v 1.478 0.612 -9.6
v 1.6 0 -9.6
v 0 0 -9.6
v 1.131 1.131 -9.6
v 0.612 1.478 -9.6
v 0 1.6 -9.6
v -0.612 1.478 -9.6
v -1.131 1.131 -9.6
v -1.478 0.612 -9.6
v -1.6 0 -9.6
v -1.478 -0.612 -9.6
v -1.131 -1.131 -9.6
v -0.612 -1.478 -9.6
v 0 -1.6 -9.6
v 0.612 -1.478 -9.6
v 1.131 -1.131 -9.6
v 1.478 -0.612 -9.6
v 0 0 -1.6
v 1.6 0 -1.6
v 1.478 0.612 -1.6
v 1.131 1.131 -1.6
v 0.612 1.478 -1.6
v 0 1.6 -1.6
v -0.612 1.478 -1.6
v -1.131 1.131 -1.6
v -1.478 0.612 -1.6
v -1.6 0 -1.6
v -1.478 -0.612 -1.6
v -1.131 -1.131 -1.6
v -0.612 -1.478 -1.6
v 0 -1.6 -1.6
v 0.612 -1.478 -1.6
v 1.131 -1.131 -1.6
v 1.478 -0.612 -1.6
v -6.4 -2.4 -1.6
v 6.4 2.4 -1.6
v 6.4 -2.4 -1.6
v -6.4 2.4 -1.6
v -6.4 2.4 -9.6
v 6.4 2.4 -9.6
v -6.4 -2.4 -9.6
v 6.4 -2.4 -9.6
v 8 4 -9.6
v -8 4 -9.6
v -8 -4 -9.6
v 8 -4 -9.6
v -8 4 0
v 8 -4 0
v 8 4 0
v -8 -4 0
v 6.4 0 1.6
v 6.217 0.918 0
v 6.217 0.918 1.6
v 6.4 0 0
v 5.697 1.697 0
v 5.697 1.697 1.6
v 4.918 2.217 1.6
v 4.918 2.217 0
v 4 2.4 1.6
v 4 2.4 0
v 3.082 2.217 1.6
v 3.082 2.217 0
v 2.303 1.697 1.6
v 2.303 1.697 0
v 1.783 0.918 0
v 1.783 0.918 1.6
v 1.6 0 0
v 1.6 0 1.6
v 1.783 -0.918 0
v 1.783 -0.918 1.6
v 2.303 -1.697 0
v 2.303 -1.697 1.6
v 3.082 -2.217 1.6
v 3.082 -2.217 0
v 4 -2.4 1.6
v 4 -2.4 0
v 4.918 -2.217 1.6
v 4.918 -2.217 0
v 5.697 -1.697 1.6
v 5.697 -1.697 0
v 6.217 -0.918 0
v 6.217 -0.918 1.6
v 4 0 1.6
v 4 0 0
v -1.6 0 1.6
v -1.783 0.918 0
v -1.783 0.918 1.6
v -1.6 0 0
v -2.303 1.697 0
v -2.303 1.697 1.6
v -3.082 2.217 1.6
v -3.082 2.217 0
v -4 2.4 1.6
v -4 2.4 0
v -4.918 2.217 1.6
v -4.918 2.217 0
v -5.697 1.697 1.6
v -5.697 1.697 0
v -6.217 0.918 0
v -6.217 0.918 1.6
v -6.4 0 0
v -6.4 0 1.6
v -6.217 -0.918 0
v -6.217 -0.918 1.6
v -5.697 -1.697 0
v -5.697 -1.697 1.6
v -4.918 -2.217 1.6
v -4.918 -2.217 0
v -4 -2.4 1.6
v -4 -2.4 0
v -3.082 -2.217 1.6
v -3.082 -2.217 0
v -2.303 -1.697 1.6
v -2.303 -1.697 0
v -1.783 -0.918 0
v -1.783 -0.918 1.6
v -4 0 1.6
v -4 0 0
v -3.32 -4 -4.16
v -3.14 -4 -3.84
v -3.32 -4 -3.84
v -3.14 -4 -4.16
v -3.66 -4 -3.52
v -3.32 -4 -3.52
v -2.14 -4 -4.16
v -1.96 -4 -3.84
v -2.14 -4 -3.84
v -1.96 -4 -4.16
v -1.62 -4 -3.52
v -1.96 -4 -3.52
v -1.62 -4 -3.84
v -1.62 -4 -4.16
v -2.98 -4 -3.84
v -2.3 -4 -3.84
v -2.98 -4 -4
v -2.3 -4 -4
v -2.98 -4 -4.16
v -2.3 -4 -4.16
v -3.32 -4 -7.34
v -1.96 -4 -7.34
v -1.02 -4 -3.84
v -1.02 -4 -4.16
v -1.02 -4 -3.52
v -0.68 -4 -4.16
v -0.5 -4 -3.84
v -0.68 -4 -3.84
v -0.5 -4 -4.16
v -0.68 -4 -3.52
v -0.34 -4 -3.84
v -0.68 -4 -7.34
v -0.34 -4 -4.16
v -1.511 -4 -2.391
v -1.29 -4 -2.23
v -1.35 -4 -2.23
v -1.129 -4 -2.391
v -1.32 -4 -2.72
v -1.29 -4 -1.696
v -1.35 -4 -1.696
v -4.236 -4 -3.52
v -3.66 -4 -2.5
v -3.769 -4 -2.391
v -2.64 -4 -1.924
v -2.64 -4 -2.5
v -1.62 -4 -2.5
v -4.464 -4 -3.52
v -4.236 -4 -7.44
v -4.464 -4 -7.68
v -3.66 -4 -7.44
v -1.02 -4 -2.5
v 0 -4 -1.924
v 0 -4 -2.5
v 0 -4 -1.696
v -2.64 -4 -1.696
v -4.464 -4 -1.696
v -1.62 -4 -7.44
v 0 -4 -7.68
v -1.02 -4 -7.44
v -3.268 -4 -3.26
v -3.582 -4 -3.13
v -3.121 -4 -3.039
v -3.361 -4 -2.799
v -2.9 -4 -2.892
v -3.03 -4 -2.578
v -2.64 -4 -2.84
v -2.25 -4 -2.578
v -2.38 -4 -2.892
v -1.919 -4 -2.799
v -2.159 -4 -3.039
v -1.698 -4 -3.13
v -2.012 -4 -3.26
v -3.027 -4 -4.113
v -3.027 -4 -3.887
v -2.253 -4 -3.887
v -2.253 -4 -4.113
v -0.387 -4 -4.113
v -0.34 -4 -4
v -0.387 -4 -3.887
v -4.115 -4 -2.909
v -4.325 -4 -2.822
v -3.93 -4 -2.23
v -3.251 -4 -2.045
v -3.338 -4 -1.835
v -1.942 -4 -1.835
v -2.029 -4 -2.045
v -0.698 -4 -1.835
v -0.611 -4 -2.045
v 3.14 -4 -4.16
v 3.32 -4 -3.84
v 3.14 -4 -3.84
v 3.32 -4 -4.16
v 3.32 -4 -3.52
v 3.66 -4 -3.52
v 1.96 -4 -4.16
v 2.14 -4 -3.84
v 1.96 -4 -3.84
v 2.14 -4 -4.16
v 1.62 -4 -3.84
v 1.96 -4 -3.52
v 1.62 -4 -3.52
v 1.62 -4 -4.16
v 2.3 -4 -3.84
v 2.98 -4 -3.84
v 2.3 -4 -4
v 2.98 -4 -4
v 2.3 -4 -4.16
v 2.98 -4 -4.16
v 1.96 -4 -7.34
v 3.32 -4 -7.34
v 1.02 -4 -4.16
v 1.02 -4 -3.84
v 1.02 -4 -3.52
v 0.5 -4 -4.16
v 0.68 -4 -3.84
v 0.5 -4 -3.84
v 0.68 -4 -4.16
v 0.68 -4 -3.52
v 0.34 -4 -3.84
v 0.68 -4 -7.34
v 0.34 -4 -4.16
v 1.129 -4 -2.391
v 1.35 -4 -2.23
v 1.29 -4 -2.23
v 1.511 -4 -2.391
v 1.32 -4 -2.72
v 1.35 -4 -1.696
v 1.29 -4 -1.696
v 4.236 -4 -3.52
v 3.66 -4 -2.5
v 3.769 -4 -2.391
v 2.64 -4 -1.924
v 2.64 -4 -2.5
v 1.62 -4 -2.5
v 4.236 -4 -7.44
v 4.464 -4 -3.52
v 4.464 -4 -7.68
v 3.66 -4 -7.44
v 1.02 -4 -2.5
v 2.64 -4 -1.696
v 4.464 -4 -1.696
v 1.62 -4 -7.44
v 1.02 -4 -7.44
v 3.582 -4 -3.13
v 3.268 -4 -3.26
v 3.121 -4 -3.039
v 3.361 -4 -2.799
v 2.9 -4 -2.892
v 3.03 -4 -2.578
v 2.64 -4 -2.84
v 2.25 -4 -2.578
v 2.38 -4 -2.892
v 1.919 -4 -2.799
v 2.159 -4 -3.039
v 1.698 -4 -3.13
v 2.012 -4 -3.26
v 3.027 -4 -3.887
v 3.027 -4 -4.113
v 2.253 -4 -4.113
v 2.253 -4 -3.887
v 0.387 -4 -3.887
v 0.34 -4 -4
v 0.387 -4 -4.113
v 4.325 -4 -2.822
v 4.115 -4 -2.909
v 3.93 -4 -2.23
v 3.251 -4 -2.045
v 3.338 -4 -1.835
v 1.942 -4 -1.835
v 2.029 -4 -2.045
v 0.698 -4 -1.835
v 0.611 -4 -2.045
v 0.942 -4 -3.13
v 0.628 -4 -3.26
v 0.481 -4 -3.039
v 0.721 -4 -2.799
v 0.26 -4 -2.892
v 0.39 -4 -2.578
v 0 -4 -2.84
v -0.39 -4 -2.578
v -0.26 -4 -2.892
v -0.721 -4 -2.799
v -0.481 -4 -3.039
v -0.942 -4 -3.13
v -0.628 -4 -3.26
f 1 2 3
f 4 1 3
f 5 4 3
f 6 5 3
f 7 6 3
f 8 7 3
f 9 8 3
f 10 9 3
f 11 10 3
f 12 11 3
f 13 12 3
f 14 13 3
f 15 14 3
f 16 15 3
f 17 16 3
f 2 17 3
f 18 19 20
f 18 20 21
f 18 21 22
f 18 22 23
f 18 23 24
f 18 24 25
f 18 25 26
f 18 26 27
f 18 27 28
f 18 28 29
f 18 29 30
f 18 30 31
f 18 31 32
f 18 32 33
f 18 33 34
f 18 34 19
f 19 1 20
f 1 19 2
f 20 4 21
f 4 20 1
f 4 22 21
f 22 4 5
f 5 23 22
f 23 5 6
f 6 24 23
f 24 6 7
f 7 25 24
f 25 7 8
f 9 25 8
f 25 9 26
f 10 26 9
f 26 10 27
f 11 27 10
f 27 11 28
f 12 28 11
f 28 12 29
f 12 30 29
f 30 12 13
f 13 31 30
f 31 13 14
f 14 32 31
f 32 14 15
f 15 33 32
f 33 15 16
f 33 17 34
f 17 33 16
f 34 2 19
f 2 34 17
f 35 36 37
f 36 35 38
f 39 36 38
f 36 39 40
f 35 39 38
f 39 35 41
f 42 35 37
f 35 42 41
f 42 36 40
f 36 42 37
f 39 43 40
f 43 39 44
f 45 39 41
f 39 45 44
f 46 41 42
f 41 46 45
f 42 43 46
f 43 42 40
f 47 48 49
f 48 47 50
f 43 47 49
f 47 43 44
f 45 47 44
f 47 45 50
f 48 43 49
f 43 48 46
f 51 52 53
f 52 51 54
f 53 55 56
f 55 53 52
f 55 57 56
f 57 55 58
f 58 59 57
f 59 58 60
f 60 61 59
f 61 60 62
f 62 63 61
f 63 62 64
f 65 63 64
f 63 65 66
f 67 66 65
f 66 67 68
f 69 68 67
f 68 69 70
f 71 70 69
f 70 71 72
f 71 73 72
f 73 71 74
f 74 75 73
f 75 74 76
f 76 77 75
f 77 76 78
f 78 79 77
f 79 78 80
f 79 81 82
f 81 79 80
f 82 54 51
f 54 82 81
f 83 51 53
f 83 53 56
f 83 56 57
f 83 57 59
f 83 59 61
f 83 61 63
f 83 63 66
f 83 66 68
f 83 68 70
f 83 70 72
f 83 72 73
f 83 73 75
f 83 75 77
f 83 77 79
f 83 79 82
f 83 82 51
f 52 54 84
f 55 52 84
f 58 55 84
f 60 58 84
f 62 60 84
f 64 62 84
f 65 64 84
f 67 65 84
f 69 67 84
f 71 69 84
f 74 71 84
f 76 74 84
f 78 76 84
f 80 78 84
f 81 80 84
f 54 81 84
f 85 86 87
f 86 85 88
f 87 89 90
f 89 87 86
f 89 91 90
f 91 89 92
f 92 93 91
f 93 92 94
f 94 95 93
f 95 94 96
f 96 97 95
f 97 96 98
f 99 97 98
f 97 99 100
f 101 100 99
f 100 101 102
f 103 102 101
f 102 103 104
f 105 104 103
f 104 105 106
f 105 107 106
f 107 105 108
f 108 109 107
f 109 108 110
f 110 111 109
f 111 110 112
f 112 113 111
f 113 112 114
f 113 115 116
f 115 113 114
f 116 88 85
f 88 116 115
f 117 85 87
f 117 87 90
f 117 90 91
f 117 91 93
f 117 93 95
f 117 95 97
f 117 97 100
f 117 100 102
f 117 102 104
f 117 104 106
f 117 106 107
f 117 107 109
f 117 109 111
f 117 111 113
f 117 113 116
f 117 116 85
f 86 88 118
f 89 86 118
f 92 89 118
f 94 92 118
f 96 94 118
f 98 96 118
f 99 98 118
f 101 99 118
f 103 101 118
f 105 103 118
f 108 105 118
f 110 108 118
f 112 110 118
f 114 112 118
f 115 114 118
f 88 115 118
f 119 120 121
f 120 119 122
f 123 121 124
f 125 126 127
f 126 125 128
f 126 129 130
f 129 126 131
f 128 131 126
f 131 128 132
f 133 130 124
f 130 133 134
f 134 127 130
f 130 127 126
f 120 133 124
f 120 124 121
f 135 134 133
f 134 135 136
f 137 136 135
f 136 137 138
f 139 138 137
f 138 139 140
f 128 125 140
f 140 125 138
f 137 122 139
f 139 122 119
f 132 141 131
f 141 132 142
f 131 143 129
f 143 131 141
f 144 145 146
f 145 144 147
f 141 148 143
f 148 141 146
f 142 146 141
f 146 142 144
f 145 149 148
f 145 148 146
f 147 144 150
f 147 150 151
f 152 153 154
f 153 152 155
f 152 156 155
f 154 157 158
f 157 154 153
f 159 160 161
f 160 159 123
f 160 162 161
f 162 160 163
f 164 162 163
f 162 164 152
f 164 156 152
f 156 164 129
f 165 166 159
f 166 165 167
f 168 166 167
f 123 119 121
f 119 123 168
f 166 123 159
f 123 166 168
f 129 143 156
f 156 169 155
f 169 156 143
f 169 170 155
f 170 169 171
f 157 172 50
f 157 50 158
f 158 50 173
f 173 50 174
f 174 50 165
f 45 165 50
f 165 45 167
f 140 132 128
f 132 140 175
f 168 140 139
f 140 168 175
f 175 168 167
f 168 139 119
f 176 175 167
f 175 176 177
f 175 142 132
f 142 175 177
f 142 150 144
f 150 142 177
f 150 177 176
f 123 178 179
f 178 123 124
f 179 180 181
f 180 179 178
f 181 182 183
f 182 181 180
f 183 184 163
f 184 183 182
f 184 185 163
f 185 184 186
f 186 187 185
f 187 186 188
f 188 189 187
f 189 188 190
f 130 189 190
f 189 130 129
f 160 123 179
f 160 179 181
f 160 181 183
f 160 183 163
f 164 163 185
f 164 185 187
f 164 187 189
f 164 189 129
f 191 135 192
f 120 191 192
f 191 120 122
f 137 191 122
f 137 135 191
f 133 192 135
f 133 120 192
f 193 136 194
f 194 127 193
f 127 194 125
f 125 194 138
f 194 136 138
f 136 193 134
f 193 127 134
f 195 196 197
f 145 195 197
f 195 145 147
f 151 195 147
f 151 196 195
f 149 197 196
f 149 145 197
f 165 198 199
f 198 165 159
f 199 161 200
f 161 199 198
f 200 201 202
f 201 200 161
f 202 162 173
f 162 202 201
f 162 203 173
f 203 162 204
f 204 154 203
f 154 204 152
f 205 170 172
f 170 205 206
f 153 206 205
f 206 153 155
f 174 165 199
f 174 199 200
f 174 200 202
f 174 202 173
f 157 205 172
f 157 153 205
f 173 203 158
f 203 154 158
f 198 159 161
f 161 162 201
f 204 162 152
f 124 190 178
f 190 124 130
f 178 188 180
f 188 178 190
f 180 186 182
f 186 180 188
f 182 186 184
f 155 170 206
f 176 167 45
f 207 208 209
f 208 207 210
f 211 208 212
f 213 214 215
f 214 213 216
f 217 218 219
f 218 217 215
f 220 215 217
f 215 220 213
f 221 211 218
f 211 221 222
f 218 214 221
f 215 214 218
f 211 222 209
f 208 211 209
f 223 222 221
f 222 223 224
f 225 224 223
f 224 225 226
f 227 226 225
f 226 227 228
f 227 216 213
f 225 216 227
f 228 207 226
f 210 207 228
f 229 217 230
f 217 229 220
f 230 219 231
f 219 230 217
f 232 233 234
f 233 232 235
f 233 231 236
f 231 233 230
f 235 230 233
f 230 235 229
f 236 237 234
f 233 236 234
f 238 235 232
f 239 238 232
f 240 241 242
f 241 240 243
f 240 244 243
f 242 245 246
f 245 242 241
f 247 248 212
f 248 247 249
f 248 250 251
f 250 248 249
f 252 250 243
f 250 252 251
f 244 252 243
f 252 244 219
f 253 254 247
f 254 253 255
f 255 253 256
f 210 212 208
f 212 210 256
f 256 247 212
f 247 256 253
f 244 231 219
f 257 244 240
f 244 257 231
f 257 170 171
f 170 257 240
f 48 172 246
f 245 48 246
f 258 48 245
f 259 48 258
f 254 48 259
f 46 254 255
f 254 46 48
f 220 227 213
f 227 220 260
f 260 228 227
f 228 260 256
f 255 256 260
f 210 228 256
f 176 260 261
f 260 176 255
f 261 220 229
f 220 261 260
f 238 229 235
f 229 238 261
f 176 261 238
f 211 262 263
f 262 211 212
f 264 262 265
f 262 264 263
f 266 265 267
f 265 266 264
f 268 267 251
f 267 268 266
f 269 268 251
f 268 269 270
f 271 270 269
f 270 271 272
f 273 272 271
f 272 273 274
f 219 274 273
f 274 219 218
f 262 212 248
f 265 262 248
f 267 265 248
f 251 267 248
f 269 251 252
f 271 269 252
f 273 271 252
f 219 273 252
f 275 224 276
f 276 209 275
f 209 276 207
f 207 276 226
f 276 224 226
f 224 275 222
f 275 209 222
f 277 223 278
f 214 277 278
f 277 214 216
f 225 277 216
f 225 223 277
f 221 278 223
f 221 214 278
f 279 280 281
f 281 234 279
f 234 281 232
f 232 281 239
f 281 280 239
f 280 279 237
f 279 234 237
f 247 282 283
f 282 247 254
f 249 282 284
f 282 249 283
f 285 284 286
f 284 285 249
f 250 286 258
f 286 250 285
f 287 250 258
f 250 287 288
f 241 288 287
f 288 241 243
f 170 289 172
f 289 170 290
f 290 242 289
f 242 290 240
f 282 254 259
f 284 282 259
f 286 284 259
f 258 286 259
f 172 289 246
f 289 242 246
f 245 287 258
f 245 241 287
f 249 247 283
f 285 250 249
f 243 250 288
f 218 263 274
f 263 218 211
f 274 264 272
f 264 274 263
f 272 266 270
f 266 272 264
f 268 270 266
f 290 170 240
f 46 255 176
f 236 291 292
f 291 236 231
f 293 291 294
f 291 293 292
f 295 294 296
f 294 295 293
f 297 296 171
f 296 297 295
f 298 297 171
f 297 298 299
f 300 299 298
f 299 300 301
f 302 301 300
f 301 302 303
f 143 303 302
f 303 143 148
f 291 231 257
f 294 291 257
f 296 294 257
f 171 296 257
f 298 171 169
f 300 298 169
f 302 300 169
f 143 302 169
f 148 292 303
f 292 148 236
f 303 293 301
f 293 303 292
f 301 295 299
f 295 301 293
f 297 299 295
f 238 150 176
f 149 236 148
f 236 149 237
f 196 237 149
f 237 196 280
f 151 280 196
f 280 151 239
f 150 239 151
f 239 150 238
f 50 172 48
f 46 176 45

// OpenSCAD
use <../lib.scad>
use <../p/2-4chrd.scad>
use <../p/2-4ndis.scad>
use <../p/2-4ring2.scad>
use <s/3004p0js01.scad>
use <s/3004s01.scad>
function ldraw_lib__3004p0j() = [
// 0 Brick  1 x  2 with  3 Black and Light Bluish Grey Castle Window Pattern
// 0 Name: 3004p0j.dat
// 0 Author: Philippe Hurbain [Philo]
// 0 !LDRAW_ORG Part UPDATE 2026-03
// 0 !LICENSE Licensed under CC BY 4.0 : see CAreadme.txt
// 
// 0 BFC CERTIFY CCW
  [0,"BFC","CERTIFY"],
  [0,"BFC","CCW"],
// 
// 0 !KEYWORDS Architecture, Bricklink 3004pb341, Brickowl 989032, Brickset 113284
// 0 !KEYWORDS Neuschwanstein Castle, Rebrickable 3004pr0120, Set 21063
// 
// 0 !HISTORY 2026-03-31 [OrionP] Official Update 2026-03
// 
// 1 16 0 0 0 1 0 0 0 1 0 0 0 1 s\3004s01.dat
  [1,16,0,0,0,1,0,0,0,1,0,0,0,1, ldraw_lib__s__3004s01()],
// 1 16 0 0 0 1 0 0 0 1 0 0 0 1 s\3004p0js01.dat
  [1,16,0,0,0,1,0,0,0,1,0,0,0,1, ldraw_lib__s__3004p0js01()],
// 1 16 0 0 0 -1 0 0 0 1 0 0 0 1 s\3004p0js01.dat
  [1,16,0,0,0,-1,0,0,0,1,0,0,0,1, ldraw_lib__s__3004p0js01()],
// 1 71 0 8.8 -10 .85 0 0 0 0 -.85 0 1 0 2-4ring2.dat
  [1,71,0,8.8,-10,.85,0,0,0,0,-.85,0,1,0, ldraw_lib__2_4ring2()],
// 1 16 0 8.8 -10 2.55 0 0 0 0 -2.55 0 1 0 2-4ndis.dat
  [1,16,0,8.8,-10,2.55,0,0,0,0,-2.55,0,1,0, ldraw_lib__2_4ndis()],
// 1 0 0 8.8 -10 1.7 0 0 0 0 -1.7 0 1 0 2-4chrd.dat
  [1,0,0,8.8,-10,1.7,0,0,0,0,-1.7,0,1,0, ldraw_lib__2_4chrd()],
// 3 71 1.7 18.35 -10 -1.7 18.35 -10 0 19.2 -10
  [3,71,1.7,18.35,-10,-1.7,18.35,-10,0,19.2,-10],
// 4 0 1.7 8.8 -10 -1.7 8.8 -10 -.85 9.6 -10 .85 9.6 -10
  [4,0,1.7,8.8,-10,-1.7,8.8,-10,-.85,9.6,-10,.85,9.6,-10],
// 4 0 .85 9.6 -10 -.85 9.6 -10 -.85 10 -10 .85 10 -10
  [4,0,.85,9.6,-10,-.85,9.6,-10,-.85,10,-10,.85,10,-10],
// 4 0 .85 10 -10 -.85 10 -10 -.85 10.4 -10 .85 10.4 -10
  [4,0,.85,10,-10,-.85,10,-10,-.85,10.4,-10,.85,10.4,-10],
// 4 0 .85 10.4 -10 -.85 10.4 -10 -1.7 18.35 -10 1.7 18.35 -10
  [4,0,.85,10.4,-10,-.85,10.4,-10,-1.7,18.35,-10,1.7,18.35,-10],
// 3 16 -20 0 -10 0 4.24 -10 20 0 -10
  [3,16,-20,0,-10,0,4.24,-10,20,0,-10],
// 3 16 20 24 -10 0 19.2 -10 -20 24 -10
  [3,16,20,24,-10,0,19.2,-10,-20,24,-10],
];
module ldraw_lib__3004p0j(step=0, col=false, unit=2/5, alt=false, line=0.2, solid=!$preview)
    makepoly(ldraw_lib__3004p0j(), step=step, col=col, unit=unit, alt=alt, line=line, solid=solid);
ldraw_lib__3004p0j(line=0.2);
